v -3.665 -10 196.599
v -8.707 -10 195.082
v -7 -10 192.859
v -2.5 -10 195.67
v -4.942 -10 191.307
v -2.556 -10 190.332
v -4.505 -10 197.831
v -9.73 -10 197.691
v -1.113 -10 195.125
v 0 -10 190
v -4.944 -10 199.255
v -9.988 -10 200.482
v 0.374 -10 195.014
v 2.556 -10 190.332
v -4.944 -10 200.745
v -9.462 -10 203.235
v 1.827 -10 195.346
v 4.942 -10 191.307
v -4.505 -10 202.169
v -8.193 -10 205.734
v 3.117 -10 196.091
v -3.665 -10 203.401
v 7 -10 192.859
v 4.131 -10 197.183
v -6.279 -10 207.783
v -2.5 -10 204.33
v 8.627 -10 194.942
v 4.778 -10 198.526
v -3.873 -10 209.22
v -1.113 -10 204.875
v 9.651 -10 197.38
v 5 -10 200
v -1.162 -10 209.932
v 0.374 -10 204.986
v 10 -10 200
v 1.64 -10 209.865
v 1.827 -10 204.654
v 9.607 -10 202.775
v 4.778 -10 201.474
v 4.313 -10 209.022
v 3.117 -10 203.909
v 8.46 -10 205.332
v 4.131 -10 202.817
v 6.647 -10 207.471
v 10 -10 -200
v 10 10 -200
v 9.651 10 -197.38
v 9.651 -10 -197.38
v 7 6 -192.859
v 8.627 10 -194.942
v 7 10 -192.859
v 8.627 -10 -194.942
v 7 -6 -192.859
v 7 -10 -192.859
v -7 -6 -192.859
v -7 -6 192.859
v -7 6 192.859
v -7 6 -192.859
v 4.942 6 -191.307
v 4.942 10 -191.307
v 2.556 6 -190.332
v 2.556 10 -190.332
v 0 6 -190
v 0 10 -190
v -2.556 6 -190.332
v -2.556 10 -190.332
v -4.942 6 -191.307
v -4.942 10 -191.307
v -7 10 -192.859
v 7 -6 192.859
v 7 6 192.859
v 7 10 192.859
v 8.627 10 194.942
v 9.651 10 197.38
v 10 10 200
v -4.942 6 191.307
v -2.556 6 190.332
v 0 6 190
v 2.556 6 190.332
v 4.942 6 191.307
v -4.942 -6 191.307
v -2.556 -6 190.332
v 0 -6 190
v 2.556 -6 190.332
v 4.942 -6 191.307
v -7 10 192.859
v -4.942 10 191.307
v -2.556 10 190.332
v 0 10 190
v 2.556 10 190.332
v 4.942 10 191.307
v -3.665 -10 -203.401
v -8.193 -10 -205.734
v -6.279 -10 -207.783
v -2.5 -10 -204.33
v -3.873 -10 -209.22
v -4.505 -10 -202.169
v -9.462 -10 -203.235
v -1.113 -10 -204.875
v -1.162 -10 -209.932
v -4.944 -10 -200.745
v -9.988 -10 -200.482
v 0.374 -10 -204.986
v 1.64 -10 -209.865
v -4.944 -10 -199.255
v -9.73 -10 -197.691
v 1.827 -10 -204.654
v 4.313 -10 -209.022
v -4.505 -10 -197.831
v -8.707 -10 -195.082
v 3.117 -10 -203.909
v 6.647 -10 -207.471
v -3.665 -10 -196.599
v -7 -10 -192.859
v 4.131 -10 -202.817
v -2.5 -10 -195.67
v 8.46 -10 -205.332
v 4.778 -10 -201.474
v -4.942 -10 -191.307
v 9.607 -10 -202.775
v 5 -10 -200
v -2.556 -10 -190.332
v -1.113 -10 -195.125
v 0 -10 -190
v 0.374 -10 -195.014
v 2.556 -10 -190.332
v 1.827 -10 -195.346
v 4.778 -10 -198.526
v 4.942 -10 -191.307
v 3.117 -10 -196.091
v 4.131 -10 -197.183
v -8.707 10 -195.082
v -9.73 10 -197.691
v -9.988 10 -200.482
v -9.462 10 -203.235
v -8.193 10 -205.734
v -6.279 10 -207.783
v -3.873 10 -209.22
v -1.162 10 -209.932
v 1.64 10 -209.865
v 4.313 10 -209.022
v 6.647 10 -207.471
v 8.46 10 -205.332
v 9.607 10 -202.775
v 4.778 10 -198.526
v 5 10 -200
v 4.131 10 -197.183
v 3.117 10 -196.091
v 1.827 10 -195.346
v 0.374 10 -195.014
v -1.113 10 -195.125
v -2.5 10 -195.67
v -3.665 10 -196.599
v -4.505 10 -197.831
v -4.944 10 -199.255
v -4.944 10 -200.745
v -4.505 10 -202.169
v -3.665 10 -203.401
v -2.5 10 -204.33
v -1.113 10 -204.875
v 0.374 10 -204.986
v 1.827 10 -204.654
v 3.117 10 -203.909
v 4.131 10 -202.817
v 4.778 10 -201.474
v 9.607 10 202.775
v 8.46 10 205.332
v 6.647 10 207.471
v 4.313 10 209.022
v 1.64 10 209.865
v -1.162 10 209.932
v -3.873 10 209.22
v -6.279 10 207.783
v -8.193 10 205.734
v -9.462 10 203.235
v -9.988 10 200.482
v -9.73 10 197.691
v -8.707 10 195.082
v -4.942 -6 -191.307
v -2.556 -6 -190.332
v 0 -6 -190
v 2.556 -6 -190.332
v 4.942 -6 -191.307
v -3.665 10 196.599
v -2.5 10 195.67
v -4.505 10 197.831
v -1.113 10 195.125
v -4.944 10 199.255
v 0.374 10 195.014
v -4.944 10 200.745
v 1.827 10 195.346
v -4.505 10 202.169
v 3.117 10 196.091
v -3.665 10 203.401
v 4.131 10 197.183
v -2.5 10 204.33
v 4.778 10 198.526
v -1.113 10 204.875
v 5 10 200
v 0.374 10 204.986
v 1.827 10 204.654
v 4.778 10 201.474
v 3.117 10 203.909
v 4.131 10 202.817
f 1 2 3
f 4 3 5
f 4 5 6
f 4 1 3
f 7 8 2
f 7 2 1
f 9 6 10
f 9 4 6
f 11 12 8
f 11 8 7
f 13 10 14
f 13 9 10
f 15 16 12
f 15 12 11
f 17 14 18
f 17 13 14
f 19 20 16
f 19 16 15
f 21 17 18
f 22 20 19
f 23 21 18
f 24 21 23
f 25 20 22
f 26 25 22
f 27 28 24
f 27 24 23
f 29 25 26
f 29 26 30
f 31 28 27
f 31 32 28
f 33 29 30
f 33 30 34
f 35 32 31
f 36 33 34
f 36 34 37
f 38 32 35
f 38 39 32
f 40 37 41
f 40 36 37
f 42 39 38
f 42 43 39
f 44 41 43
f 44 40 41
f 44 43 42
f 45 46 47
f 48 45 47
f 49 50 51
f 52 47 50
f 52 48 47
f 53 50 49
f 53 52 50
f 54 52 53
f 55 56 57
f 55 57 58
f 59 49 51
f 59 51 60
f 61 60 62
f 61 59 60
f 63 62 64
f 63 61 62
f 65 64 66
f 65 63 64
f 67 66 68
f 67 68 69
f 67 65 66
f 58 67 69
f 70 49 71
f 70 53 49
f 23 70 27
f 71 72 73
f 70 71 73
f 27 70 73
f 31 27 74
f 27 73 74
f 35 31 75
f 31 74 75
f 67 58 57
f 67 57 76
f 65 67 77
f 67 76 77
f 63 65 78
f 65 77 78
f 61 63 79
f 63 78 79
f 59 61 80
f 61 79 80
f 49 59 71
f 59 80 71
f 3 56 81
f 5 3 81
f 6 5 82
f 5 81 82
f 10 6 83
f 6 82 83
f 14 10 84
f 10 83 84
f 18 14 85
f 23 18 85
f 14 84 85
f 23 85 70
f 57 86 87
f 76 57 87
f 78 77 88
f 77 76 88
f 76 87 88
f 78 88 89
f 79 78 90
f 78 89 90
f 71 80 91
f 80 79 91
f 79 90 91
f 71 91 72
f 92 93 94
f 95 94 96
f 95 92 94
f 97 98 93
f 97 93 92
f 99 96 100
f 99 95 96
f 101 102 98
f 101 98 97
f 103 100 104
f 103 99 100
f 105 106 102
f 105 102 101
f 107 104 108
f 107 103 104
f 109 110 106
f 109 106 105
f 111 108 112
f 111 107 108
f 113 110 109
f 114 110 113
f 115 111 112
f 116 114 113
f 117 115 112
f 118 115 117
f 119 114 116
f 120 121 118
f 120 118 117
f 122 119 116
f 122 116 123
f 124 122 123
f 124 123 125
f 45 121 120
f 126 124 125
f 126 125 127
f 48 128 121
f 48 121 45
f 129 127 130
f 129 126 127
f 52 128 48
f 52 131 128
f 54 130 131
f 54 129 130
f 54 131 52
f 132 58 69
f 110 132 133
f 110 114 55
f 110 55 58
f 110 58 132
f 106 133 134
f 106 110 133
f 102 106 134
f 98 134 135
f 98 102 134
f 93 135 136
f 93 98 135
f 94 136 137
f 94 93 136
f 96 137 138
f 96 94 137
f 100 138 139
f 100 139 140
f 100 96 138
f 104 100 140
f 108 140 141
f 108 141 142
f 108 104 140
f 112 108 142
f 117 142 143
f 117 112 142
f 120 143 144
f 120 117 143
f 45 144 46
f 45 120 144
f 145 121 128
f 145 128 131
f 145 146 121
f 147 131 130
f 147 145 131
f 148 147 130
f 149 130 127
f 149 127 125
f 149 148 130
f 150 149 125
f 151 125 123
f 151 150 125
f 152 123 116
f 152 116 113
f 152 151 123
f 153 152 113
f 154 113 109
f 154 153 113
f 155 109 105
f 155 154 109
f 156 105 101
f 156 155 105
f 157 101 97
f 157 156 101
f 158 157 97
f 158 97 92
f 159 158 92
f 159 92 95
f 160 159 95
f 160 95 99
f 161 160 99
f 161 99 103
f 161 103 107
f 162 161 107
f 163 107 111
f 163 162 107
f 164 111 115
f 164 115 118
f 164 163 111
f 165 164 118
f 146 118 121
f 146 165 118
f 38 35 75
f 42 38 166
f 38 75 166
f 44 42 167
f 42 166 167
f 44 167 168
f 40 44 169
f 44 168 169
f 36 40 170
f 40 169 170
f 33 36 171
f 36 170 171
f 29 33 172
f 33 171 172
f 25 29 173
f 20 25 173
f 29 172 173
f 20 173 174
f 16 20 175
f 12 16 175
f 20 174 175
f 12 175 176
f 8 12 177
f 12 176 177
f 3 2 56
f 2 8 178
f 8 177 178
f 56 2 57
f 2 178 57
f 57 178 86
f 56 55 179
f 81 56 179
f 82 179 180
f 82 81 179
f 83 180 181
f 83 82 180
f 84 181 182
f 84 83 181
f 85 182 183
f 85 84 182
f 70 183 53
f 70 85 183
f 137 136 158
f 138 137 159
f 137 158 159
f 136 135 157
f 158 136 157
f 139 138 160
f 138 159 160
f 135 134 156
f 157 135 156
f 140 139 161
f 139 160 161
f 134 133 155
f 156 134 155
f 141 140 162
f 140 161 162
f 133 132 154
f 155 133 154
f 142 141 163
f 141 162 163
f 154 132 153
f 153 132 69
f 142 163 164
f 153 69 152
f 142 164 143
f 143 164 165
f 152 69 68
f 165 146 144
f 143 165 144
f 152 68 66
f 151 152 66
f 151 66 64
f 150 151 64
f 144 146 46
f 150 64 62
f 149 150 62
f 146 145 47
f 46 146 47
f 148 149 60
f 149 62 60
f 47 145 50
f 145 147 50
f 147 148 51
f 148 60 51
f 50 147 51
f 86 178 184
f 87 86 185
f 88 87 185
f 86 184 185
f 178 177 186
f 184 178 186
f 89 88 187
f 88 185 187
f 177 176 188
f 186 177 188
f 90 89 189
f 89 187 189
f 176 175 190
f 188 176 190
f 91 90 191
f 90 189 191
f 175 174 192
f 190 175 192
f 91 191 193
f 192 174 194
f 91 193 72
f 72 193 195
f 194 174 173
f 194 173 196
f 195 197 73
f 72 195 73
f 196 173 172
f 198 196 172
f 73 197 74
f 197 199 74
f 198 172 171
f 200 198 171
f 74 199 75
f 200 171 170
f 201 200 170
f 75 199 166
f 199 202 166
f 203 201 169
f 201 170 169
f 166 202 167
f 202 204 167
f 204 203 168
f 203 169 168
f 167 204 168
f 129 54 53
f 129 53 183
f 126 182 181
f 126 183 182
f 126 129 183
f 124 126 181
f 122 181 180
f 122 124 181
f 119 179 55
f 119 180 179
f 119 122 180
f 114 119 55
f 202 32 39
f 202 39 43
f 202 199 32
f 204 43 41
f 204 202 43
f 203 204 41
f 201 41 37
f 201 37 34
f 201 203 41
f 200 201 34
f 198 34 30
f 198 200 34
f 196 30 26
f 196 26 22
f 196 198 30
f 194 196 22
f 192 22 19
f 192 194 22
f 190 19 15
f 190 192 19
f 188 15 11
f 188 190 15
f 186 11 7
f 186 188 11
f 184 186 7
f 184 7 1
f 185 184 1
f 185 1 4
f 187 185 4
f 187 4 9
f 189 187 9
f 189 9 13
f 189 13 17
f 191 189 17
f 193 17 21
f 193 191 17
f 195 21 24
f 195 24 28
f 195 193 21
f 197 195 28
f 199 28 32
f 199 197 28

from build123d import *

# Parameters (mm, degrees)
F0_R     = 5
F1_DEPTH = 10
F2_DEPTH = 6


with BuildPart() as f1:
    # F0 (on Front) → F1 (new body, symmetric)
    with BuildSketch(Plane.XZ):
        with BuildLine():
            ThreePointArc((7, 192.858572), (9.219544, 196.127017), (10, 200))
            ThreePointArc((10, 200), (-3.872983, 209.219544), (-7, 192.858572))
            ThreePointArc((-7, 192.858572), (0, 190), (7, 192.858572))
        make_face()
        with Locations((0, 200)):
            Circle(F0_R, mode=Mode.SUBTRACT)
        with BuildLine():
            ThreePointArc((7, -192.858572), (0, -190), (-7, -192.858572))
            ThreePointArc((-7, -192.858572), (-3.872983, -209.219544), (10, -200))
            ThreePointArc((10, -200), (9.219544, -196.127017), (7, -192.858572))
        make_face()
        with Locations((0, -200)):
            Circle(F0_R, mode=Mode.SUBTRACT)
    extrude(amount=F1_DEPTH, both=True)

    # F0 (on Front) → F2 (join, symmetric)
    with BuildSketch(Plane.XZ):
        with BuildLine():
            ThreePointArc((7, 192.858572), (0, 190), (-7, 192.858572))
            Line((-7, 192.858572), (-7, -192.858572))
            ThreePointArc((-7, -192.858572), (0, -190), (7, -192.858572))
            Line((7, -192.858572), (7, 192.858572))
        make_face()
    extrude(amount=F2_DEPTH, both=True)


solid = f1.part
